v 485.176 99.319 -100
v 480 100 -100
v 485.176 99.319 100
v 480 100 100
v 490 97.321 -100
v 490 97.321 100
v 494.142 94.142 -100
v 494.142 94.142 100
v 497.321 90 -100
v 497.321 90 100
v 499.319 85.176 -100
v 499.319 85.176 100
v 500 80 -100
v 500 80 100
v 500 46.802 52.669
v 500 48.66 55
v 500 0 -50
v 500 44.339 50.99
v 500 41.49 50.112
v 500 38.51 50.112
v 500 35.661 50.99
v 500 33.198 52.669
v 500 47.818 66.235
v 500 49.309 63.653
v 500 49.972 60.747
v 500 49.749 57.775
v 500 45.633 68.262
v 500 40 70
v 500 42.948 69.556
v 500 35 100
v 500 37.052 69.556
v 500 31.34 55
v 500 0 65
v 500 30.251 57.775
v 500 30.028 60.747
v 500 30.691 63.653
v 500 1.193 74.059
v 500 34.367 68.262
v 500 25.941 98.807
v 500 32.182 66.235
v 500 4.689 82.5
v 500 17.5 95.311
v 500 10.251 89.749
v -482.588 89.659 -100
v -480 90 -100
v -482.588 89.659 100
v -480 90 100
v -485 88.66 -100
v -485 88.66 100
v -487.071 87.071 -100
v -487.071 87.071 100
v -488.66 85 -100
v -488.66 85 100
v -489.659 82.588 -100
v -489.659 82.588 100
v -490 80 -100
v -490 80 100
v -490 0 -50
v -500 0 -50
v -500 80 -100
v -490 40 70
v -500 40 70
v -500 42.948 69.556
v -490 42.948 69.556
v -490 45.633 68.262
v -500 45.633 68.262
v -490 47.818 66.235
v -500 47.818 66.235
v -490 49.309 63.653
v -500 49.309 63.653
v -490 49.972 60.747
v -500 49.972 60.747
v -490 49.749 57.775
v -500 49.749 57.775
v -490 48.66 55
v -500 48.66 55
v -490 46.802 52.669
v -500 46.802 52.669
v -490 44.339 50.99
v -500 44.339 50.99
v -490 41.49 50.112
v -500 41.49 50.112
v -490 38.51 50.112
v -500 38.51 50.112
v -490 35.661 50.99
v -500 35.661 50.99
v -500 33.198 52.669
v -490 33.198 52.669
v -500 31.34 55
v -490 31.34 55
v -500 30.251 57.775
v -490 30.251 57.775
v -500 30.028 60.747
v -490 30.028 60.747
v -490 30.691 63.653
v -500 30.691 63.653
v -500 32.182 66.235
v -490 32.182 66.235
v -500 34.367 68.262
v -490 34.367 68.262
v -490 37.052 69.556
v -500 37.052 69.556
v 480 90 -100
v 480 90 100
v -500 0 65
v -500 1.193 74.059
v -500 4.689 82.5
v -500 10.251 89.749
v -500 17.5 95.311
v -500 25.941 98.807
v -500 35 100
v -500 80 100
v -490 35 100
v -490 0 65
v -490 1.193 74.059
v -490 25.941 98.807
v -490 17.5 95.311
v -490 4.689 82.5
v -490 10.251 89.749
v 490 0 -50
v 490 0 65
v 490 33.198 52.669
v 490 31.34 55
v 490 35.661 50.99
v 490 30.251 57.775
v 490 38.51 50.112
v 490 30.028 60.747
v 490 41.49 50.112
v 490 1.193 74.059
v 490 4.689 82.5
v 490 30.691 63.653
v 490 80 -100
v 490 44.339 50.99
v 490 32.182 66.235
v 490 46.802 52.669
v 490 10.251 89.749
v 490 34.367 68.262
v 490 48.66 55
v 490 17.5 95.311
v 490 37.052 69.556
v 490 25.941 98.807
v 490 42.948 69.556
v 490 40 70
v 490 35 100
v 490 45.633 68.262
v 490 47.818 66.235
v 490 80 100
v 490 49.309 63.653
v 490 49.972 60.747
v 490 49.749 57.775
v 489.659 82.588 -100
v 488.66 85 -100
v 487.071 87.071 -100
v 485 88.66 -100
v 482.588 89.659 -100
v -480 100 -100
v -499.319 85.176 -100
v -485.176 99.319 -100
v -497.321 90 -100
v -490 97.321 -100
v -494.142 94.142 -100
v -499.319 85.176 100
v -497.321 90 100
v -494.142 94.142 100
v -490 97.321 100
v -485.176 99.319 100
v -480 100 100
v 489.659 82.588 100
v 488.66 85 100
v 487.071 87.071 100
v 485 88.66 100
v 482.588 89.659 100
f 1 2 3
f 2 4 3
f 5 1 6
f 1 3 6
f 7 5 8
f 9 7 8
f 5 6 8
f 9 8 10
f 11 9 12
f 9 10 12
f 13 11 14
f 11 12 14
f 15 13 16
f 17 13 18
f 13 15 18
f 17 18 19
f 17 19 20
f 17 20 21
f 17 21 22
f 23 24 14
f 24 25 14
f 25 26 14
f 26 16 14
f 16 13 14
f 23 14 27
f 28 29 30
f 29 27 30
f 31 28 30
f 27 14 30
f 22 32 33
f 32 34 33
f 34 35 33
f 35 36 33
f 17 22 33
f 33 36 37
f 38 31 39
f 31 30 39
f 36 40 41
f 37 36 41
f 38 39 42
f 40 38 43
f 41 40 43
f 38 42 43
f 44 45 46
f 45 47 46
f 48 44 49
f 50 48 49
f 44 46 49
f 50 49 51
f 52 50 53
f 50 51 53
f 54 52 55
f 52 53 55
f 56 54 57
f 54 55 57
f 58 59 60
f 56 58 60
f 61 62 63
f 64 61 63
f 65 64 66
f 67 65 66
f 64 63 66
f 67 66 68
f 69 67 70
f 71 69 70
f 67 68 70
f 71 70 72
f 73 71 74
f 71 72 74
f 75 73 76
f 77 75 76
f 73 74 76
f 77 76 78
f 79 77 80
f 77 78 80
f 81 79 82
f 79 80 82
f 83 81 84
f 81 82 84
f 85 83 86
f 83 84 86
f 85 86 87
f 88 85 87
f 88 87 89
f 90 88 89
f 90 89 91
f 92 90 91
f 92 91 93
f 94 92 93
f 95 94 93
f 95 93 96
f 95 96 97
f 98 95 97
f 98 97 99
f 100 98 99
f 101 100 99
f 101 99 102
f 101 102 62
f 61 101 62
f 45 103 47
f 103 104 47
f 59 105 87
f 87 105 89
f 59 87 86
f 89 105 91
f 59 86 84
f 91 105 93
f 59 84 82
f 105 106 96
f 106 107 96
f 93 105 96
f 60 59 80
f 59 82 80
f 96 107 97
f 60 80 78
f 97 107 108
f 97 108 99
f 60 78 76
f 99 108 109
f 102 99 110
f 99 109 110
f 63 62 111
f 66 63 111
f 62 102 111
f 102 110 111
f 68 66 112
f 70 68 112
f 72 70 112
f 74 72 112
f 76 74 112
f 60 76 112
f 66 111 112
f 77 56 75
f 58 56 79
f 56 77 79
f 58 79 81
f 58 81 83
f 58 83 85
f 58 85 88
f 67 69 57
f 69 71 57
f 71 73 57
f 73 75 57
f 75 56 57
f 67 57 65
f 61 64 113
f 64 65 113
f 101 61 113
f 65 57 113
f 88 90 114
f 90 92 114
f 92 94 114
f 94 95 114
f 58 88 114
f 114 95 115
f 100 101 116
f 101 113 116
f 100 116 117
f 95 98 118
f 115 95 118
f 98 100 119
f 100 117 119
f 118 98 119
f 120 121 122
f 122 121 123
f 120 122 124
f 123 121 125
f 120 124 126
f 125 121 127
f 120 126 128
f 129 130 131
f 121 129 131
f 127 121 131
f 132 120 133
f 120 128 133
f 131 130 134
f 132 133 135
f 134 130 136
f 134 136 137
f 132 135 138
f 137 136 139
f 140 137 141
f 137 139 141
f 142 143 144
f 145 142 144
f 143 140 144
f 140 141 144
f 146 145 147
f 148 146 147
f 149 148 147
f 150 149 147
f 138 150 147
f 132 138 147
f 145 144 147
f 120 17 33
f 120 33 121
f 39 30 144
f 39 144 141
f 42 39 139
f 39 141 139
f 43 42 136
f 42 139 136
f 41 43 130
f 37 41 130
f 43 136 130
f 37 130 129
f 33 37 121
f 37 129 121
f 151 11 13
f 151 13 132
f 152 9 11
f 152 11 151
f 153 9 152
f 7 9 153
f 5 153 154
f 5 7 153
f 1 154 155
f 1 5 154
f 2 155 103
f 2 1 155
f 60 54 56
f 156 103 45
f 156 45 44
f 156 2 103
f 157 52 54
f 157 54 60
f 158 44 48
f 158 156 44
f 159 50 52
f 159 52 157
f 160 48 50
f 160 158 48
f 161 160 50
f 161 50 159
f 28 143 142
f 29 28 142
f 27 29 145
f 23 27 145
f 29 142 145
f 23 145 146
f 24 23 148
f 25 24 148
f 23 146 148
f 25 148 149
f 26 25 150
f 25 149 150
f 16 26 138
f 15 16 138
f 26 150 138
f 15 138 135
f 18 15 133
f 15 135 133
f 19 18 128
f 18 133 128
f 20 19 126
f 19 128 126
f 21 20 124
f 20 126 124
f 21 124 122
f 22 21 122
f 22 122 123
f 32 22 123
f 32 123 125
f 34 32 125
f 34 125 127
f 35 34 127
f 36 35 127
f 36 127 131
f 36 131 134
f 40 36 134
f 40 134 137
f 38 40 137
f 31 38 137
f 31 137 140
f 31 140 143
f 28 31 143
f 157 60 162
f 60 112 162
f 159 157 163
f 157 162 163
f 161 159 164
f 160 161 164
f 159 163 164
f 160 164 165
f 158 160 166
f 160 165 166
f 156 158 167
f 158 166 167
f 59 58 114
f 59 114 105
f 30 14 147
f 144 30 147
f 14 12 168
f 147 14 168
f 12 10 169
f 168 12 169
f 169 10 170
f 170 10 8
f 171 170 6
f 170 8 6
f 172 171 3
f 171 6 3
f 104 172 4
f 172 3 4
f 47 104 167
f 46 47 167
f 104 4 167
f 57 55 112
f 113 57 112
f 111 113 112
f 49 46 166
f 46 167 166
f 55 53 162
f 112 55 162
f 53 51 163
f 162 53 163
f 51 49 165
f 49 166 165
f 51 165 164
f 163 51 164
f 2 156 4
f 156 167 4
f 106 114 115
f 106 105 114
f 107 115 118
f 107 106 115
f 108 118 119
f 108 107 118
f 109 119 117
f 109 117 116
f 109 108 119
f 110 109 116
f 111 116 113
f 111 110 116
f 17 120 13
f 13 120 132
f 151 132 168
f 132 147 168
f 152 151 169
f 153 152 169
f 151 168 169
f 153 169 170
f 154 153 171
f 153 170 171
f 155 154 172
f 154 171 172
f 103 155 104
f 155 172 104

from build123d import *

# Parameters (mm, degrees)
EXTRUDE_THIN1_DEPTH = 100
CUT_EXTRUDE1_DEPTH  = 1218
SKETCH4_R           = 10
CUT_EXTRUDE2_DEPTH  = 1285
FILLET1_R           = 35


with BuildPart() as part:
    # Sketch2 → Extrude-Thin1 (new, symmetric)
    with BuildSketch(Plane.XY):
        with BuildLine():
            Line((-500, 0), (-500, 80))
            ThreePointArc((-500, 80), (-494.142135624, 94.142135624), (-480, 100))
            Line((-480, 100), (480, 100))
            ThreePointArc((480, 100), (494.142135624, 94.142135624), (500, 80))
            Line((500, 80), (500, 0))
            Line((500, 0), (490, 0))
            Line((490, 0), (490, 80))
            ThreePointArc((490, 80), (487.071067812, 87.071067812), (480, 90))
            Line((480, 90), (-480, 90))
            ThreePointArc((-480, 90), (-487.071067812, 87.071067812), (-490, 80))
            Line((-490, 80), (-490, 0))
            Line((-490, 0), (-500, 0))
        make_face()
    extrude(amount=EXTRUDE_THIN1_DEPTH, both=True)

    # Sketch3 → Cut-Extrude1 (cut)
    with BuildSketch(Plane.ZY.offset(500)):
        Polygon((-100, 80), (-100, 0), (-50, 0), align=None)
    extrude(amount=-CUT_EXTRUDE1_DEPTH, mode=Mode.SUBTRACT)

    # Sketch4 → Cut-Extrude2 (cut)
    with BuildSketch(Plane.ZY.offset(500)):
        with Locations((60, 40)):
            Circle(SKETCH4_R)
    extrude(amount=-CUT_EXTRUDE2_DEPTH, mode=Mode.SUBTRACT)

    # Fillet1
    fillet1_edges = [part.edges().sort_by_distance(p)[0] for p in [
        (-495, 0, 100),
        (495, 0, 100),
    ]]
    fillet(fillet1_edges, radius=FILLET1_R)


solid = part.part
